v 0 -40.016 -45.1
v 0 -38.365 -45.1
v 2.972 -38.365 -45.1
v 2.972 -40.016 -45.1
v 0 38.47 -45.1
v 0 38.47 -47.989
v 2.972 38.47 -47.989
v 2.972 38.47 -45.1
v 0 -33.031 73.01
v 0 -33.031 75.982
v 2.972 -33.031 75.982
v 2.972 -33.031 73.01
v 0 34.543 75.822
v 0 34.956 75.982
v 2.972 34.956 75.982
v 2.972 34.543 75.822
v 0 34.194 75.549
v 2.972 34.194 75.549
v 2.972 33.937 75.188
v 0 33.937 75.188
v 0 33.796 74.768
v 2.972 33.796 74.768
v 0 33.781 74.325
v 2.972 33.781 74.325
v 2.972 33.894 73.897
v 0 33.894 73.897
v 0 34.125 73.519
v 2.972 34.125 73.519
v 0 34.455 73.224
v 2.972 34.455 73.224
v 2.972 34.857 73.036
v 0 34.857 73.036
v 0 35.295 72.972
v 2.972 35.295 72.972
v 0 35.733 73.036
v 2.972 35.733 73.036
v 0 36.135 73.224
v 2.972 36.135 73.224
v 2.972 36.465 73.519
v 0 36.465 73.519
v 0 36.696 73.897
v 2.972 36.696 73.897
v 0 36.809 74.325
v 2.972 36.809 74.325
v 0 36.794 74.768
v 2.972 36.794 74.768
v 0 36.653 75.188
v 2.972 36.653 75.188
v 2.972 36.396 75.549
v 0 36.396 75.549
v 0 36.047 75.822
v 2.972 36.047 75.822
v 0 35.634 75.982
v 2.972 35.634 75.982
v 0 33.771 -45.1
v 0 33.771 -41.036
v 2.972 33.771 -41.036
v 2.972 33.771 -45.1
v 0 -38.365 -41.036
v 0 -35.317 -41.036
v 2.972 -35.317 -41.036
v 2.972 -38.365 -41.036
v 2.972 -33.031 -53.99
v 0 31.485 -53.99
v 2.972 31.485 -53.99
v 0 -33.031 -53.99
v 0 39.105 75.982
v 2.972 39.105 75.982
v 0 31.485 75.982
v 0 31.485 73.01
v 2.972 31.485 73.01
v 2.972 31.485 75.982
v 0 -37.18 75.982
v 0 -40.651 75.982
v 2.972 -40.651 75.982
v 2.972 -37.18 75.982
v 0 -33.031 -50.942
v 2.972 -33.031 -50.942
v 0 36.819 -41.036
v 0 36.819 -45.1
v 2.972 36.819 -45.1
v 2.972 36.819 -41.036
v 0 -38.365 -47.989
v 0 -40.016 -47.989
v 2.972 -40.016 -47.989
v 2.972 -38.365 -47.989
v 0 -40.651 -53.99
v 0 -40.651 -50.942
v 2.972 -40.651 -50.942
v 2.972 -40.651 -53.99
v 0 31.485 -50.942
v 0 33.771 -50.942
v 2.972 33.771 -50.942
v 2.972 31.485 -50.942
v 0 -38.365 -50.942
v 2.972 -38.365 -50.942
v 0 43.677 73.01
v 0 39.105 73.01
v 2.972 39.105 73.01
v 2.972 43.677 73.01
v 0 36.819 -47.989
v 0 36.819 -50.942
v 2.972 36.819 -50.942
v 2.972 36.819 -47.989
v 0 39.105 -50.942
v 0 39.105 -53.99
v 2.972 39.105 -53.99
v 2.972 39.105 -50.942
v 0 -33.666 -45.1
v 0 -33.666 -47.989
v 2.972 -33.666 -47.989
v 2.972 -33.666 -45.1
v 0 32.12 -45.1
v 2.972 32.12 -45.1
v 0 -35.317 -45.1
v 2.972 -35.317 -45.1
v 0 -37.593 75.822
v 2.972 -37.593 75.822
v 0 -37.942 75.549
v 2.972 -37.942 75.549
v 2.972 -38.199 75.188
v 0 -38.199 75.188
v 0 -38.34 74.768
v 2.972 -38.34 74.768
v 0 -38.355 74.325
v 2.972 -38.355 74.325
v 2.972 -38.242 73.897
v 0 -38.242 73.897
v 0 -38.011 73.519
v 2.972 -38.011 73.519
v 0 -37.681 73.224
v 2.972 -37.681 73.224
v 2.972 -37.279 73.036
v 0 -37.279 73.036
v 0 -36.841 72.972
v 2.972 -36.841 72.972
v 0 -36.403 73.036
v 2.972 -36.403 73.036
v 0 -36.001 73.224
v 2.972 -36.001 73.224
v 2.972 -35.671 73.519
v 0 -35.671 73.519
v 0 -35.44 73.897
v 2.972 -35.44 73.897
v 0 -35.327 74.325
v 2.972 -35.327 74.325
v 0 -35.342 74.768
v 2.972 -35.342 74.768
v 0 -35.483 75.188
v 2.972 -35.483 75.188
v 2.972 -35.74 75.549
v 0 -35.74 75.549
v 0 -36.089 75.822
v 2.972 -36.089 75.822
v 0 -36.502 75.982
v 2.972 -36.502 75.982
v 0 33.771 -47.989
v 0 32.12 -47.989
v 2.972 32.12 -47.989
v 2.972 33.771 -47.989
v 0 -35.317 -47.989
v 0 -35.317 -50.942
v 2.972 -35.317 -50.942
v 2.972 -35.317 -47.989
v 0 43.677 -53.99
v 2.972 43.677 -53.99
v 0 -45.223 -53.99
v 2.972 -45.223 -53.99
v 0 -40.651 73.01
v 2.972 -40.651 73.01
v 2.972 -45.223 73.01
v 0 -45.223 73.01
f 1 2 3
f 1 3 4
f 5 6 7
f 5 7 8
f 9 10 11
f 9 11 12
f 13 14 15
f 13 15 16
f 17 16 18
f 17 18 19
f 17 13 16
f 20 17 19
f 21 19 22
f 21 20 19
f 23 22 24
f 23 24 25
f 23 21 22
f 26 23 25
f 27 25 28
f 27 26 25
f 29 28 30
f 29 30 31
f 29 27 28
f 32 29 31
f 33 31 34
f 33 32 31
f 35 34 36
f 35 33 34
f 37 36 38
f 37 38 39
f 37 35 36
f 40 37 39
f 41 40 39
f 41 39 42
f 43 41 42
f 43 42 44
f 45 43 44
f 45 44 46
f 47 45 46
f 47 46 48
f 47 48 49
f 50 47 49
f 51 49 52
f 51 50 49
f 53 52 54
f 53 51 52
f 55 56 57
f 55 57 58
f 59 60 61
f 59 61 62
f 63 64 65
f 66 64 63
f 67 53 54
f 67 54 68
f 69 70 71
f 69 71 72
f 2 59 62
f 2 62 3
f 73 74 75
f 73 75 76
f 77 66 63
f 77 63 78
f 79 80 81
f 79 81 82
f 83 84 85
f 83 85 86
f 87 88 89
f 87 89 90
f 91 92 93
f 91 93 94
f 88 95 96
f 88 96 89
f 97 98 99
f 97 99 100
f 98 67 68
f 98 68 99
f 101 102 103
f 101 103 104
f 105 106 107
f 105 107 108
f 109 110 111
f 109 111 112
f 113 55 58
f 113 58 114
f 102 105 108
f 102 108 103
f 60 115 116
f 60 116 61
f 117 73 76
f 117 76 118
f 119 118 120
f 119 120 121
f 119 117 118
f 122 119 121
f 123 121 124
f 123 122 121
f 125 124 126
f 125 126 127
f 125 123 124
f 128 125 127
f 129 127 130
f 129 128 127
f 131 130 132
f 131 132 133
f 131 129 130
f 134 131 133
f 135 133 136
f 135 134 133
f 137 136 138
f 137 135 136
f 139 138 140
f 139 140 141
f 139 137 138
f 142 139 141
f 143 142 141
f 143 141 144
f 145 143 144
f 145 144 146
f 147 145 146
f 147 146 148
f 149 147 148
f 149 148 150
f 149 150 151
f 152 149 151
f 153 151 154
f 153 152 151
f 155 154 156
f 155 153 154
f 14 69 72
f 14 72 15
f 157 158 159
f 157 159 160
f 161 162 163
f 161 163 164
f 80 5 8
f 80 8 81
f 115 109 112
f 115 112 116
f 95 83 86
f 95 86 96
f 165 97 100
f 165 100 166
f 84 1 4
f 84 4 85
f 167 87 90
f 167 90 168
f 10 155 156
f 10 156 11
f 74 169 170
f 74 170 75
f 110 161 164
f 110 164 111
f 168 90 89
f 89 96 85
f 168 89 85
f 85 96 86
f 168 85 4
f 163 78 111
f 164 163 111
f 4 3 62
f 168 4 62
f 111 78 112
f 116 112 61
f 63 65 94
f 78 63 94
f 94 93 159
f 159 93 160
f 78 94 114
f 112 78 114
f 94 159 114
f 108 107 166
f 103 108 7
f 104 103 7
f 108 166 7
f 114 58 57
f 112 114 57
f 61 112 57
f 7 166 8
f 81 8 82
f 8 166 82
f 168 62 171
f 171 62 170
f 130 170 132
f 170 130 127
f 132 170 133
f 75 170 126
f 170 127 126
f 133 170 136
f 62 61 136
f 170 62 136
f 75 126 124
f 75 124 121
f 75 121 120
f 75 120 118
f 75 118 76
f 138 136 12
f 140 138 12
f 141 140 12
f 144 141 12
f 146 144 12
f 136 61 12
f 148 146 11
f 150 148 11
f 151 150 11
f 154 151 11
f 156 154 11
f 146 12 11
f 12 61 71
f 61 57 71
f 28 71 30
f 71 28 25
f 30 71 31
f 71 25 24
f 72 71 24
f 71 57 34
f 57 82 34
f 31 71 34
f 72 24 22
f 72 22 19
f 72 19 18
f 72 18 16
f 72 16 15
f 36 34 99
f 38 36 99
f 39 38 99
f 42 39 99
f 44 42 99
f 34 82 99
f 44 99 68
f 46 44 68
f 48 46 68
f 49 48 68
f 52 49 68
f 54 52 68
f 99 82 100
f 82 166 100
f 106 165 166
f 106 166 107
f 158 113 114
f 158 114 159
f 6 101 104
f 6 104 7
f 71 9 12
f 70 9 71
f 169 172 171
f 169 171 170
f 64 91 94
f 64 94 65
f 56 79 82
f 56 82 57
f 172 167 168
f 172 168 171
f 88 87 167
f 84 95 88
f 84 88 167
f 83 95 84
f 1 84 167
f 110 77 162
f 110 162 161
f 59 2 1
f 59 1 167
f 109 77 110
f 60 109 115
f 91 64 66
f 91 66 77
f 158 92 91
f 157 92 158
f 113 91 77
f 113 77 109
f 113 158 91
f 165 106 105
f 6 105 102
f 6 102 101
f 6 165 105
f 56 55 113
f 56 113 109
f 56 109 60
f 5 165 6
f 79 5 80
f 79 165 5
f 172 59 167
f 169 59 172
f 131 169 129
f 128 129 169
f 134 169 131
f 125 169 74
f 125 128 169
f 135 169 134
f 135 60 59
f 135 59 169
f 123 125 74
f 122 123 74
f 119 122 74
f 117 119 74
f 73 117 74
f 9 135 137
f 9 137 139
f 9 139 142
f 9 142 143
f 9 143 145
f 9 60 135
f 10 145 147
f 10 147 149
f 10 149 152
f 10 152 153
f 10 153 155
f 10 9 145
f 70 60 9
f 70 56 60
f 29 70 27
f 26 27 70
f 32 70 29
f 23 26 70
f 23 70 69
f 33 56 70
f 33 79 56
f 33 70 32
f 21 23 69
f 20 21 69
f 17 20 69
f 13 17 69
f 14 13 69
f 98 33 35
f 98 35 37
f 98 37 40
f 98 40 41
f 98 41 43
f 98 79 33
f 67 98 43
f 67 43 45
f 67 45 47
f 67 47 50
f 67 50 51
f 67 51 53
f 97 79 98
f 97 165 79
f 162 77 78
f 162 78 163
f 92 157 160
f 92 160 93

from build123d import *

# Parameters (mm, degrees)
BOSS_EXTRUDE1_DEPTH = 2.9718


with BuildPart() as part:
    # Sketch2 → Boss-Extrude1 (new body)
    with BuildSketch(Plane(origin=(0, 0, 0), x_dir=(0, 0, -1), z_dir=(1, 0, 0))):
        with BuildLine():
            Line((-73.009928621, 43.676956522), (53.990071379, 43.676956522))
            Line((53.990071379, 43.676956522), (53.990071379, 39.104956522))
            Line((53.990071379, 39.104956522), (50.942071379, 39.104956522))
            Line((50.942071379, 39.104956522), (50.942071379, 36.818956522))
            Line((50.942071379, 36.818956522), (47.989076338, 36.818956522))
            Line((47.989076338, 36.818956522), (47.989076338, 38.469956522))
            Line((47.989076338, 38.469956522), (45.100071379, 38.469956522))
            Line((45.100071379, 38.469956522), (45.100071379, 36.818956522))
            Line((45.100071379, 36.818956522), (41.036071379, 36.818956522))
            Line((41.036071379, 36.818956522), (41.036071379, 33.770956522))
            Line((41.036071379, 33.770956522), (45.100071379, 33.770956522))
            Line((45.100071379, 33.770956522), (45.100071379, 32.119956522))
            Line((45.100071379, 32.119956522), (47.989076338, 32.119956522))
            Line((47.989076338, 32.119956522), (47.989076338, 33.770956522))
            Line((47.989076338, 33.770956522), (50.942071379, 33.770956522))
            Line((50.942071379, 33.770956522), (50.942071379, 31.484956522))
            Line((50.942071379, 31.484956522), (53.990071379, 31.484956522))
            Line((53.990071379, 31.484956522), (53.990071379, -33.031043478))
            Line((53.990071379, -33.031043478), (50.942071379, -33.031043478))
            Line((50.942071379, -33.031043478), (50.942071379, -35.317043478))
            Line((50.942071379, -35.317043478), (47.989076338, -35.317043478))
            Line((47.989076338, -35.317043478), (47.989076338, -33.666043478))
            Line((47.989076338, -33.666043478), (45.100071379, -33.666043478))
            Line((45.100071379, -33.666043478), (45.100071379, -35.317043478))
            Line((45.100071379, -35.317043478), (41.036071379, -35.317043478))
            Line((41.036071379, -35.317043478), (41.036071379, -38.365043478))
            Line((41.036071379, -38.365043478), (45.100071379, -38.365043478))
            Line((45.100071379, -38.365043478), (45.100071379, -40.016043478))
            Line((45.100071379, -40.016043478), (47.989076338, -40.016043478))
            Line((47.989076338, -40.016043478), (47.989076338, -38.365043478))
            Line((47.989076338, -38.365043478), (50.942071379, -38.365043478))
            Line((50.942071379, -38.365043478), (50.942071379, -40.651043478))
            Line((50.942071379, -40.651043478), (53.990071379, -40.651043478))
            Line((53.990071379, -40.651043478), (53.990071379, -45.223043478))
            Line((53.990071379, -45.223043478), (-73.009928621, -45.223043478))
            Line((-73.009928621, -45.223043478), (-73.009928621, -40.651043478))
            Line((-73.009928621, -40.651043478), (-75.981728621, -40.651043478))
            Line((-75.981728621, -40.651043478), (-75.981728621, -37.179683686))
            ThreePointArc((-75.981728621, -37.179683686), (-72.971828621, -36.841043478), (-75.981728621, -36.502403271))
            Line((-75.981728621, -36.502403271), (-75.981728621, -33.031043478))
            Line((-75.981728621, -33.031043478), (-73.009928621, -33.031043478))
            Line((-73.009928621, -33.031043478), (-73.009928621, 31.484956522))
            Line((-73.009928621, 31.484956522), (-75.981728621, 31.484956522))
            Line((-75.981728621, 31.484956522), (-75.981728621, 34.956316314))
            ThreePointArc((-75.981728621, 34.956316314), (-72.971828621, 35.294956522), (-75.981728621, 35.633596729))
            Line((-75.981728621, 35.633596729), (-75.981728621, 39.104956522))
            Line((-75.981728621, 39.104956522), (-73.009928621, 39.104956522))
            Line((-73.009928621, 39.104956522), (-73.009928621, 43.676956522))
        make_face()
    extrude(amount=BOSS_EXTRUDE1_DEPTH)


solid = part.part
